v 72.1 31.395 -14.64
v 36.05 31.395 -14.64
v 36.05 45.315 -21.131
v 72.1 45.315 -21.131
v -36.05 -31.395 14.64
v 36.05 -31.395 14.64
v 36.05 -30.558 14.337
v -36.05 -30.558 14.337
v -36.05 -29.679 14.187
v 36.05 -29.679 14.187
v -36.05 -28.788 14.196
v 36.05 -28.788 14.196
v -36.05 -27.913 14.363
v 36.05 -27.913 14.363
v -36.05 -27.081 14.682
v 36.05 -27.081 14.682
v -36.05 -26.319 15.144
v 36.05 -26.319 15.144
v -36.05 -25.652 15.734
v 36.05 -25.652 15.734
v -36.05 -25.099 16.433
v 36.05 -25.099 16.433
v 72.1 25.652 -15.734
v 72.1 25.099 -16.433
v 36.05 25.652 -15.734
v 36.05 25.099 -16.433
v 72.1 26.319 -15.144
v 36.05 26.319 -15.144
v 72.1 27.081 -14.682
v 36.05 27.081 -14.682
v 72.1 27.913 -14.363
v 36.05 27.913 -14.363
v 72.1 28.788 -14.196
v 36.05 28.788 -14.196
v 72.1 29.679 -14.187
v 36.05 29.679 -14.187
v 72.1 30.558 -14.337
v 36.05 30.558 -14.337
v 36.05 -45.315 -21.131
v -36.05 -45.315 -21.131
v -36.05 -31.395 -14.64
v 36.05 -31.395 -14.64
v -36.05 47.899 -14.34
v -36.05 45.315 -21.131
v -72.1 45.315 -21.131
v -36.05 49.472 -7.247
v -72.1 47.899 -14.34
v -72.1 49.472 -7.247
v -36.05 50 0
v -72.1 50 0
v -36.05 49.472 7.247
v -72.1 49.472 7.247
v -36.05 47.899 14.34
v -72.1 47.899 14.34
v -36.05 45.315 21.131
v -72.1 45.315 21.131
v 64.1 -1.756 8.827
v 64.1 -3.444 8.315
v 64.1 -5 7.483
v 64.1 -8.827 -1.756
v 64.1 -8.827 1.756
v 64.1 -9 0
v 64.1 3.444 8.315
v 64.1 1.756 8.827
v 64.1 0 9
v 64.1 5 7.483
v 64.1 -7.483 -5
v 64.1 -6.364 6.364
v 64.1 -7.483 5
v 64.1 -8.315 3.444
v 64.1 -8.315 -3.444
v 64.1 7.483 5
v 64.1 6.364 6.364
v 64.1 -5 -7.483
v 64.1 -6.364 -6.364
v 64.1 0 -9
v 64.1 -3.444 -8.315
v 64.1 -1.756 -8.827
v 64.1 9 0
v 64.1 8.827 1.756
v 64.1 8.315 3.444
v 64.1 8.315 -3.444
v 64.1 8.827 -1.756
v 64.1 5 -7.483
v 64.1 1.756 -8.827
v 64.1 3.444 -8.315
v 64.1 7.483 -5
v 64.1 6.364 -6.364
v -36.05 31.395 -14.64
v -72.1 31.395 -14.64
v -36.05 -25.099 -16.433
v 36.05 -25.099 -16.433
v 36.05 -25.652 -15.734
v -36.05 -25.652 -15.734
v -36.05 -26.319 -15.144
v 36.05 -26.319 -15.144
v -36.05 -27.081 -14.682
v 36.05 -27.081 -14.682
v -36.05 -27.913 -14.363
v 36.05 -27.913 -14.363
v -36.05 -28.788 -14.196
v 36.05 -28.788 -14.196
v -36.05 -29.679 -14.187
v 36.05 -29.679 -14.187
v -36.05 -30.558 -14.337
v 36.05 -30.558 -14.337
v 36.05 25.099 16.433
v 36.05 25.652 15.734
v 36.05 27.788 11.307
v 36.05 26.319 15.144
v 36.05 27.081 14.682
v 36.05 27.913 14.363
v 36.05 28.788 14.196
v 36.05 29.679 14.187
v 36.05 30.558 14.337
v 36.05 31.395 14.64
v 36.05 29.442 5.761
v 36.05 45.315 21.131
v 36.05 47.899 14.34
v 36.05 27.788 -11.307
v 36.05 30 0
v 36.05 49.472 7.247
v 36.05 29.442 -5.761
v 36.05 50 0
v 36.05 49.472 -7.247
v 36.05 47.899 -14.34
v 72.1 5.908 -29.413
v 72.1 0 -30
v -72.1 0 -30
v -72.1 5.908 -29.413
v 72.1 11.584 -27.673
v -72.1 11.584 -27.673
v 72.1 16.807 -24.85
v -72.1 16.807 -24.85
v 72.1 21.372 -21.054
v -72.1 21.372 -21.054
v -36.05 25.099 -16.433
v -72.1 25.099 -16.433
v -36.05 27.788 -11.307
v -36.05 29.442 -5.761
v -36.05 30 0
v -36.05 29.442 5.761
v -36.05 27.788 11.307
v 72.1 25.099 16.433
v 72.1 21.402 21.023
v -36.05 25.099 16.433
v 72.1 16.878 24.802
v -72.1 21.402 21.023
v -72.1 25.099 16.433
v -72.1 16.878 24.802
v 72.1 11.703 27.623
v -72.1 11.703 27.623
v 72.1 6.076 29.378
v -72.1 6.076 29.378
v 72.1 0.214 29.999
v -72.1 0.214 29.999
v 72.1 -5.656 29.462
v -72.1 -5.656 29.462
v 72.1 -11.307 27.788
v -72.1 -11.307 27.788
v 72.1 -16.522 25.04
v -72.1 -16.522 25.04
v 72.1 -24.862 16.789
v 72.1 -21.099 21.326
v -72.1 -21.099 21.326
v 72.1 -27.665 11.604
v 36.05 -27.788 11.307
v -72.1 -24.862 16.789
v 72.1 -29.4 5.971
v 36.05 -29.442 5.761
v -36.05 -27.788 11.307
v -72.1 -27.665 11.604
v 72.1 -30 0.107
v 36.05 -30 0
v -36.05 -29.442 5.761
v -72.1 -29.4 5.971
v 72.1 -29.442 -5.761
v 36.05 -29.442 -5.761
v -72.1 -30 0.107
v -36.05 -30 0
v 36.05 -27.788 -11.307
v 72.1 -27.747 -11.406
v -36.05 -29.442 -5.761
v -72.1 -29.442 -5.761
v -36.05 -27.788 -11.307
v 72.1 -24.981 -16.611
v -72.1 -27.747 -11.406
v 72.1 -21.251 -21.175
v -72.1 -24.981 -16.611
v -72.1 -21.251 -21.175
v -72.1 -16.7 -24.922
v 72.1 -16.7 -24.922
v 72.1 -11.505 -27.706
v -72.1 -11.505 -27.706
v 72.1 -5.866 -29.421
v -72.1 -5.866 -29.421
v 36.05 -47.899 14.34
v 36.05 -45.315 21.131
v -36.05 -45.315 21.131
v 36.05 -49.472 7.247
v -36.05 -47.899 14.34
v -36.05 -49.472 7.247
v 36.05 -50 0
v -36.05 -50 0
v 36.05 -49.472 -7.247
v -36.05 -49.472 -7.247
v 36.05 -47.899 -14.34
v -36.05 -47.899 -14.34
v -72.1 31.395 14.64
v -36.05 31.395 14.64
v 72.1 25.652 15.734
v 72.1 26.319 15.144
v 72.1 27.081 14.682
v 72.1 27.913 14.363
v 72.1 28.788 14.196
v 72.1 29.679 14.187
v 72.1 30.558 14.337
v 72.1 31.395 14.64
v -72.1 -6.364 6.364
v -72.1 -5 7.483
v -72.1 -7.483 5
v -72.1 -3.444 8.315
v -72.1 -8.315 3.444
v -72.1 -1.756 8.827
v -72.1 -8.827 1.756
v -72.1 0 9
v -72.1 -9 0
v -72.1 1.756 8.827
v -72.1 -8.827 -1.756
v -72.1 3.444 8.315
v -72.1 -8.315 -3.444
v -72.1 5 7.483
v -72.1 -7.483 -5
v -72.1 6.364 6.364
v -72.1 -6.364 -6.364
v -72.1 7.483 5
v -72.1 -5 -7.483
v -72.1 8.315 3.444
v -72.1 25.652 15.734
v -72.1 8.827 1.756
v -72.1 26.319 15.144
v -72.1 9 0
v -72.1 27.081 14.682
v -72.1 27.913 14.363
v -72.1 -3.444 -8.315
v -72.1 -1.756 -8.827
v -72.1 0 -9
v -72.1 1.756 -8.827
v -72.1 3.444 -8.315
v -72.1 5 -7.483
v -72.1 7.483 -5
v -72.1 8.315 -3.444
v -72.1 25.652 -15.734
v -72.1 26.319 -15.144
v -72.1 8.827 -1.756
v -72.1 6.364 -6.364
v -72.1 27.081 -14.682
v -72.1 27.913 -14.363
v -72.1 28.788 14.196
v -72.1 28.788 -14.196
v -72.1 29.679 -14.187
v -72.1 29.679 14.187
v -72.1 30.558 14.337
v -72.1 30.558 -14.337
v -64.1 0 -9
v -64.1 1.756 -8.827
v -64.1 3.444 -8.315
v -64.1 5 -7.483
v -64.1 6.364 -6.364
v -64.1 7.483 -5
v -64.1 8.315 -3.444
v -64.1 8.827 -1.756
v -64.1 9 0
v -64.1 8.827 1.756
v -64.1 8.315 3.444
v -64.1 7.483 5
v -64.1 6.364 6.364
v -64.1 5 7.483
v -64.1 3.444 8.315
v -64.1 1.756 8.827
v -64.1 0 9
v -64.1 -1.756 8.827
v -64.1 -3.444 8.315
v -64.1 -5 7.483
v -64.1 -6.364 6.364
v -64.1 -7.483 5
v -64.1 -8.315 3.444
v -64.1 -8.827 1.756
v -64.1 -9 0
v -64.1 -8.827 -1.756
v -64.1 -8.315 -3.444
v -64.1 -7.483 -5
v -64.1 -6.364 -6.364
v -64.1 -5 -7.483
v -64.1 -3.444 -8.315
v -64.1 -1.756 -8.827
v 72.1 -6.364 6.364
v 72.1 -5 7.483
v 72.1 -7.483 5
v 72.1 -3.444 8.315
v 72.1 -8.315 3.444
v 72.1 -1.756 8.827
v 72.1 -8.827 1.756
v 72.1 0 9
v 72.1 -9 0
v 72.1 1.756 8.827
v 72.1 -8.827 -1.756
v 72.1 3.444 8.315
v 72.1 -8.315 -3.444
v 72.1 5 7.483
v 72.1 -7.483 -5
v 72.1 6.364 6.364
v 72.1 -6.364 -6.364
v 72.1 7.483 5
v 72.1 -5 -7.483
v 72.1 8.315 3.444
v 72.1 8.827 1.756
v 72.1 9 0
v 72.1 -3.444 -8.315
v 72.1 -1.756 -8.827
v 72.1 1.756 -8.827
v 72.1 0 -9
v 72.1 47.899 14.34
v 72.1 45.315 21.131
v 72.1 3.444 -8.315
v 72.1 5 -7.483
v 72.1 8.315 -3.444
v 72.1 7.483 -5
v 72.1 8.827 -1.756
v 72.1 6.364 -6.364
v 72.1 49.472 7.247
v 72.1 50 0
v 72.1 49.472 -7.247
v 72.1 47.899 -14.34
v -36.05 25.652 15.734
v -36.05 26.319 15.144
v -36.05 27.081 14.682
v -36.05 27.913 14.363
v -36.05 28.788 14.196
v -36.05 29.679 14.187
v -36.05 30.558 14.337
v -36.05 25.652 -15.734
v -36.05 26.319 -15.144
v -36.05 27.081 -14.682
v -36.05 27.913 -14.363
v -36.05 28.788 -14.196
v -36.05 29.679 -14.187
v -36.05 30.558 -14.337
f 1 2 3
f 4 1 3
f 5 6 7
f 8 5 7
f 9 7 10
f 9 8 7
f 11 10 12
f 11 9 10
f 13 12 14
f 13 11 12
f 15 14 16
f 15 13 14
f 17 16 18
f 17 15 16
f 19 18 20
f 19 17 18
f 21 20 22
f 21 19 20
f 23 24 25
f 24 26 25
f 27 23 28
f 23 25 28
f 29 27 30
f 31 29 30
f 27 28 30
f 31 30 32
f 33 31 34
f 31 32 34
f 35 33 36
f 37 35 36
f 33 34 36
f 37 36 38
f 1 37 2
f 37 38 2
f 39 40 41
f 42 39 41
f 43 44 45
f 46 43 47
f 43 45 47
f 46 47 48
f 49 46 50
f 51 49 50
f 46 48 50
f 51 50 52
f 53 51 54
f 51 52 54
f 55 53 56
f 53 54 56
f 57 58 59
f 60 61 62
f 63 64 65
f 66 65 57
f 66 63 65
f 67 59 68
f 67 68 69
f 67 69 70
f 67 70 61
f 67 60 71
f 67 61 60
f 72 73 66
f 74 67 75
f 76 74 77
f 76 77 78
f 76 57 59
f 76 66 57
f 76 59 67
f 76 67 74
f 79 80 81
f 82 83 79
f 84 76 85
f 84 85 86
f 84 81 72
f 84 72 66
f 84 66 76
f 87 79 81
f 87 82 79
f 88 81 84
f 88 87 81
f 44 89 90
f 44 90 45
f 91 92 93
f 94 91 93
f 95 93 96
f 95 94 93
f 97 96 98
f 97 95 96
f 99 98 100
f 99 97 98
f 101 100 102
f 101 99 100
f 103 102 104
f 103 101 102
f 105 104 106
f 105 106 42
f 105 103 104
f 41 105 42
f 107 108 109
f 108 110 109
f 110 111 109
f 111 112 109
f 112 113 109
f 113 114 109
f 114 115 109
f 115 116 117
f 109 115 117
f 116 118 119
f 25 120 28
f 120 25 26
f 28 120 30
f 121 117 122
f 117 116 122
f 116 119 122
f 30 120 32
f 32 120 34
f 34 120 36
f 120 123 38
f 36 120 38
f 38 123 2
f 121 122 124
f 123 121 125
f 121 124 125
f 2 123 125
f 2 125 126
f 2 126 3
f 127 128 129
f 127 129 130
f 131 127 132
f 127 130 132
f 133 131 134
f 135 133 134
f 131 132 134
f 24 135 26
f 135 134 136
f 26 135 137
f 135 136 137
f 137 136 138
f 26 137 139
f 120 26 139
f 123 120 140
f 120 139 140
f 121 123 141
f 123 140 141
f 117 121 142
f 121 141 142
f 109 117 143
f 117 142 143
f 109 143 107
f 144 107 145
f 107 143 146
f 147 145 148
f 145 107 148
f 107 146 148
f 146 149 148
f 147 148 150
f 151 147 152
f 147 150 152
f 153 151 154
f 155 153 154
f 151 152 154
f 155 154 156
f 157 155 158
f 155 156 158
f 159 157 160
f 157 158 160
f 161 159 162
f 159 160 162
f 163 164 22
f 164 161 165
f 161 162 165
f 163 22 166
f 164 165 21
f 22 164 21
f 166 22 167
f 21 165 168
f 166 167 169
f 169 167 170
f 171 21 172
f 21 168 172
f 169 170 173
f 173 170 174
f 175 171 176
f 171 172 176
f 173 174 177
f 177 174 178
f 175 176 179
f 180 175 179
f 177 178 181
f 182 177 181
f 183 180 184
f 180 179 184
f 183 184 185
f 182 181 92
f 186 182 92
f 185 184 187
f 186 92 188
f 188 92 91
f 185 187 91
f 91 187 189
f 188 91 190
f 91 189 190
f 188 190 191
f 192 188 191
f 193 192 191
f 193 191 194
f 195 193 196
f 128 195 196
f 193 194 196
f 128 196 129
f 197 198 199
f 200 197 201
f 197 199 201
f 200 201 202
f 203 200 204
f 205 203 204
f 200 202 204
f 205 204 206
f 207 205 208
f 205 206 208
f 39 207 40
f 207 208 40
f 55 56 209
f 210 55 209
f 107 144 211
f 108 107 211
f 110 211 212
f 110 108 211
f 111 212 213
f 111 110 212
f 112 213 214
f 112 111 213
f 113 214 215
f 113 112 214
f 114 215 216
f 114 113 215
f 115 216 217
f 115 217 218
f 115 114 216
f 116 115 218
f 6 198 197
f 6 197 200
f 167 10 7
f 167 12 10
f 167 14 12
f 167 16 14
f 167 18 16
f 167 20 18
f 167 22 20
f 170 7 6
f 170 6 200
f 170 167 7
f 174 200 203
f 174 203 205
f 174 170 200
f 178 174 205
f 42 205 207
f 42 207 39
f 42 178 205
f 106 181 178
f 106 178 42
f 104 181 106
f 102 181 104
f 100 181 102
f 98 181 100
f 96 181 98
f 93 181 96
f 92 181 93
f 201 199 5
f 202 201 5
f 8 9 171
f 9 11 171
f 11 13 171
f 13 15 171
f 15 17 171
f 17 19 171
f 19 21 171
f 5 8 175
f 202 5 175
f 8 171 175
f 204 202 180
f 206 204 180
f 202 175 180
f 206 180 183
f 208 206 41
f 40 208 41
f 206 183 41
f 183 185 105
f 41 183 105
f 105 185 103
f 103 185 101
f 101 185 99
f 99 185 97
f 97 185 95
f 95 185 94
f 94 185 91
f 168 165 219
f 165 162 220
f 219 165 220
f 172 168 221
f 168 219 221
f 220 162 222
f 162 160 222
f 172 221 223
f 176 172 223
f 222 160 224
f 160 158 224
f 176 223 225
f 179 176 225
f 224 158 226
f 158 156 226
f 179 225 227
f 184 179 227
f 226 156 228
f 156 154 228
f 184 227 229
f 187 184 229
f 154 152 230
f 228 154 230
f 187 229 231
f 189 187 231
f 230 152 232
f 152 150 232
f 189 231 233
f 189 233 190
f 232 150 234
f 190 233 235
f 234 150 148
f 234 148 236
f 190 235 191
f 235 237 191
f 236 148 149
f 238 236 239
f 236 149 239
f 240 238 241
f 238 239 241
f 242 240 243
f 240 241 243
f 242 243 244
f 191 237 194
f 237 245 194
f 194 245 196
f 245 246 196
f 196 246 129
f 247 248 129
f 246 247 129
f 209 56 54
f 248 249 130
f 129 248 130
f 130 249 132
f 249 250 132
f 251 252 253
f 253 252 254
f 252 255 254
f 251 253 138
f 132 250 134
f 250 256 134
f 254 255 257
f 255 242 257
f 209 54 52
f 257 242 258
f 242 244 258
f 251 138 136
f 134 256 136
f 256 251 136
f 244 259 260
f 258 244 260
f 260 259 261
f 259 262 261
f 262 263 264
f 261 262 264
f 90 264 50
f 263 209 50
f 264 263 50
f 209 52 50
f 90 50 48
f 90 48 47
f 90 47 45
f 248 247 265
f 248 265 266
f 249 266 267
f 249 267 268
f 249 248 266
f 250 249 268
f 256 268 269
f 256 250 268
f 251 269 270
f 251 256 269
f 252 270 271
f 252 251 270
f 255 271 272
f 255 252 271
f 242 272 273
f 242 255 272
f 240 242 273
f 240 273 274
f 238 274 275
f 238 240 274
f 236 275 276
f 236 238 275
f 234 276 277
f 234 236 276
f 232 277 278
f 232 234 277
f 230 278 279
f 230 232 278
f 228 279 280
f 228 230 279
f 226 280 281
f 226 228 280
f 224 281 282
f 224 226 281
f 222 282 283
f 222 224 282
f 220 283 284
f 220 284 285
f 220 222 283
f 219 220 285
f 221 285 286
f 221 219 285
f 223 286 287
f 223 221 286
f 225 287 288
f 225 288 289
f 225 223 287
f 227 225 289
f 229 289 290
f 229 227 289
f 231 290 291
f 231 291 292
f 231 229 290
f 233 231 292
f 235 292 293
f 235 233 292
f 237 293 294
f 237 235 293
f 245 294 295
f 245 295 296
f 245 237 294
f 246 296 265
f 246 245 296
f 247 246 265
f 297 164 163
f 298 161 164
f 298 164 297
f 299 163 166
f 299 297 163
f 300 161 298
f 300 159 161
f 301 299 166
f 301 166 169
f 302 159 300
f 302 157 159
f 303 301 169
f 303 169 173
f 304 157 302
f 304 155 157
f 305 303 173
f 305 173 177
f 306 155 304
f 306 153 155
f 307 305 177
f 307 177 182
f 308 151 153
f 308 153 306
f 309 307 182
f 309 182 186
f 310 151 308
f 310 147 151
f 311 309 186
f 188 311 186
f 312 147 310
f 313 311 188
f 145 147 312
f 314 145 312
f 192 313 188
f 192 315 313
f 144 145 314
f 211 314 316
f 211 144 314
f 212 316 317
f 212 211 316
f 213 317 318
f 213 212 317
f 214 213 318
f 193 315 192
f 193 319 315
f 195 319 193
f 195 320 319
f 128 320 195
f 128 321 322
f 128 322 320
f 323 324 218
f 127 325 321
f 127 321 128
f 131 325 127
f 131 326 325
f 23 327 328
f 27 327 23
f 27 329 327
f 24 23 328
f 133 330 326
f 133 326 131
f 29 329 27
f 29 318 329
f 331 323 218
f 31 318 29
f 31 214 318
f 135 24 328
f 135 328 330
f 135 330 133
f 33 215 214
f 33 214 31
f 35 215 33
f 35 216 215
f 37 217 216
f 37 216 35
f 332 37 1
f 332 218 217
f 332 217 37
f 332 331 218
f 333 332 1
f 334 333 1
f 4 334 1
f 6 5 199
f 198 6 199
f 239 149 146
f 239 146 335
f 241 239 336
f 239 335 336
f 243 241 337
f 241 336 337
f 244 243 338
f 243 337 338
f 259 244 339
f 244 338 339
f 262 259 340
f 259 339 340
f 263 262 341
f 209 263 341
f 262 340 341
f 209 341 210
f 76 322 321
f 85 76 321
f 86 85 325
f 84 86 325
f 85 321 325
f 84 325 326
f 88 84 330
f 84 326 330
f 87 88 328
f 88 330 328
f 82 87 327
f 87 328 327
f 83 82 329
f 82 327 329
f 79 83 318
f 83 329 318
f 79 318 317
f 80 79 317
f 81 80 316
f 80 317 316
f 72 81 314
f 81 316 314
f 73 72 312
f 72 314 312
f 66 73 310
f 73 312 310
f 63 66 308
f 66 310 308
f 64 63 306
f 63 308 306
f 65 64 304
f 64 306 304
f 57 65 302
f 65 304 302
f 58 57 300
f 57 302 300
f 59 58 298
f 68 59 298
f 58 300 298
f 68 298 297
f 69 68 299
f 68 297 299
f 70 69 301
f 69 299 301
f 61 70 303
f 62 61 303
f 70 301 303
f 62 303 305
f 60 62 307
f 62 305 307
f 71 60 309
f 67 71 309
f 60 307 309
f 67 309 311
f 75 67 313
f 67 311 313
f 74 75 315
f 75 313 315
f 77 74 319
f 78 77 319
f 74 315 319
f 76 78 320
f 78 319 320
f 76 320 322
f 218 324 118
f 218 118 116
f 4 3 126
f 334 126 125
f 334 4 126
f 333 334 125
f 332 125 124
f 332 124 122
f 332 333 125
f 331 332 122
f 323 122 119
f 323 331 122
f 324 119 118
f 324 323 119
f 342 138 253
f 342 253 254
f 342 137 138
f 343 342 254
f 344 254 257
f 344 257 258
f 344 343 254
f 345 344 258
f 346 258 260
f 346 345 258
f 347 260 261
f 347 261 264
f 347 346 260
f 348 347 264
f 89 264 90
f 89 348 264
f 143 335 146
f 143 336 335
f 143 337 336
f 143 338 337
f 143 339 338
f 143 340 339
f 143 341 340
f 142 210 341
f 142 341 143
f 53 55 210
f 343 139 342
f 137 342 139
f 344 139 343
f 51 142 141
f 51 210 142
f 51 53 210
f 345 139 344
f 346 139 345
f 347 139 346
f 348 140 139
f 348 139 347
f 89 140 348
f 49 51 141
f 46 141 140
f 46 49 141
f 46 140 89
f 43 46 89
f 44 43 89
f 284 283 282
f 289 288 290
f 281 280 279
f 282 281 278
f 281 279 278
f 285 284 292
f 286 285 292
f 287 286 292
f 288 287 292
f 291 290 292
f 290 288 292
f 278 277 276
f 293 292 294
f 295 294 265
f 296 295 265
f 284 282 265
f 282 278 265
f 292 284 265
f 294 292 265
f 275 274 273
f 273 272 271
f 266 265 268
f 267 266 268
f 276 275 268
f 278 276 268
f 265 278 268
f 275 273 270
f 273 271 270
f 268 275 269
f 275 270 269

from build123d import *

# Parameters (mm, degrees)
BOSS_EXTRUDE1_DEPTH      = 72.1
BOSS_EXTRUDE1_DEPTH_BACK = 72.1
SKETCH1_R                = 30
BOSS_EXTRUDE2_DEPTH      = 36.05
BOSS_EXTRUDE3_DEPTH      = 36.05
BOSS_EXTRUDE3_DEPTH_BACK = 36.05
SKETCH5_R                = 9
CUT_EXTRUDE1_DEPTH       = 8
FILLET1_R                = 5


with BuildPart() as part:
    # Sketch1 → Boss-Extrude1 (new, two sides: drawn at the far end of the back side and taken through both)
    with BuildSketch(Plane(origin=(0, 0, 0), x_dir=(0, 0, -1), z_dir=(1, 0, 0)).offset(-BOSS_EXTRUDE1_DEPTH_BACK)):
        Circle(SKETCH1_R)
    extrude(amount=BOSS_EXTRUDE1_DEPTH + BOSS_EXTRUDE1_DEPTH_BACK)

    # Sketch3 → Boss-Extrude2 (add)
    with BuildSketch(Plane(origin=(72.1, 0, 0), x_dir=(0, 0, -1), z_dir=(1, 0, 0))):
        with BuildLine():
            Line((7.607128711, 16.313540167), (21.130913087, 45.315389352))
            ThreePointArc((21.130913087, 45.315389352), (0, 50), (-21.130913087, 45.315389352))
            Line((-21.130913087, 45.315389352), (-7.607128711, 16.313540167))
            ThreePointArc((-7.607128711, 16.313540167), (0, 18), (7.607128711, 16.313540167))
        make_face()
    extrude(amount=-BOSS_EXTRUDE2_DEPTH)

    # Mirror1: part across plane


with BuildPart() as part_1:
    add(part.part)
    add(part.part.mirror(Plane(origin=(0, 0, 0), x_dir=(0, 0, 1), z_dir=(1, 0, 0))))

    # Sketch4 → Boss-Extrude3 (add, two sides: drawn at the far end of the back side and taken through both)
    with BuildSketch(Plane(origin=(0, 0, 0), x_dir=(0, 0, -1), z_dir=(1, 0, 0)).offset(-BOSS_EXTRUDE3_DEPTH_BACK)):
        with BuildLine():
            Line((-7.607128711, -16.313540167), (-21.130913087, -45.315389352))
            ThreePointArc((-21.130913087, -45.315389352), (0, -50), (21.130913087, -45.315389352))
            Line((21.130913087, -45.315389352), (7.607128711, -16.313540167))
            ThreePointArc((7.607128711, -16.313540167), (0, -18), (-7.607128711, -16.313540167))
        make_face()
    extrude(amount=BOSS_EXTRUDE3_DEPTH + BOSS_EXTRUDE3_DEPTH_BACK)

    # Sketch5 → Cut-Extrude1 (cut)
    with BuildSketch(Plane(origin=(72.1, 0, 0), x_dir=(0, 0, -1), z_dir=(1, 0, 0))):
        Circle(SKETCH5_R)
    cut_extrude1 = extrude(amount=-CUT_EXTRUDE1_DEPTH, mode=Mode.SUBTRACT)

    # Mirror3: Cut-Extrude1 across plane
    add(cut_extrude1.mirror(Plane(origin=(0, 0, 0), x_dir=(0, 0, 1), z_dir=(1, 0, 0))), mode=Mode.SUBTRACT)

    # Fillet1
    fillet1_edges = [part_1.edges().sort_by_distance(p)[0] for p in [
        (54.075, 27.189233611, 12.678547852),
        (54.075, 27.189233611, -12.678547852),
        (-54.075, 27.189233611, 12.678547852),
        (-54.075, 27.189233611, -12.678547852),
        (0, -27.189233611, -12.678547852),
        (0, -27.189233611, 12.678547852),
    ]]
    fillet(fillet1_edges, radius=FILLET1_R)


solid = part_1.part
